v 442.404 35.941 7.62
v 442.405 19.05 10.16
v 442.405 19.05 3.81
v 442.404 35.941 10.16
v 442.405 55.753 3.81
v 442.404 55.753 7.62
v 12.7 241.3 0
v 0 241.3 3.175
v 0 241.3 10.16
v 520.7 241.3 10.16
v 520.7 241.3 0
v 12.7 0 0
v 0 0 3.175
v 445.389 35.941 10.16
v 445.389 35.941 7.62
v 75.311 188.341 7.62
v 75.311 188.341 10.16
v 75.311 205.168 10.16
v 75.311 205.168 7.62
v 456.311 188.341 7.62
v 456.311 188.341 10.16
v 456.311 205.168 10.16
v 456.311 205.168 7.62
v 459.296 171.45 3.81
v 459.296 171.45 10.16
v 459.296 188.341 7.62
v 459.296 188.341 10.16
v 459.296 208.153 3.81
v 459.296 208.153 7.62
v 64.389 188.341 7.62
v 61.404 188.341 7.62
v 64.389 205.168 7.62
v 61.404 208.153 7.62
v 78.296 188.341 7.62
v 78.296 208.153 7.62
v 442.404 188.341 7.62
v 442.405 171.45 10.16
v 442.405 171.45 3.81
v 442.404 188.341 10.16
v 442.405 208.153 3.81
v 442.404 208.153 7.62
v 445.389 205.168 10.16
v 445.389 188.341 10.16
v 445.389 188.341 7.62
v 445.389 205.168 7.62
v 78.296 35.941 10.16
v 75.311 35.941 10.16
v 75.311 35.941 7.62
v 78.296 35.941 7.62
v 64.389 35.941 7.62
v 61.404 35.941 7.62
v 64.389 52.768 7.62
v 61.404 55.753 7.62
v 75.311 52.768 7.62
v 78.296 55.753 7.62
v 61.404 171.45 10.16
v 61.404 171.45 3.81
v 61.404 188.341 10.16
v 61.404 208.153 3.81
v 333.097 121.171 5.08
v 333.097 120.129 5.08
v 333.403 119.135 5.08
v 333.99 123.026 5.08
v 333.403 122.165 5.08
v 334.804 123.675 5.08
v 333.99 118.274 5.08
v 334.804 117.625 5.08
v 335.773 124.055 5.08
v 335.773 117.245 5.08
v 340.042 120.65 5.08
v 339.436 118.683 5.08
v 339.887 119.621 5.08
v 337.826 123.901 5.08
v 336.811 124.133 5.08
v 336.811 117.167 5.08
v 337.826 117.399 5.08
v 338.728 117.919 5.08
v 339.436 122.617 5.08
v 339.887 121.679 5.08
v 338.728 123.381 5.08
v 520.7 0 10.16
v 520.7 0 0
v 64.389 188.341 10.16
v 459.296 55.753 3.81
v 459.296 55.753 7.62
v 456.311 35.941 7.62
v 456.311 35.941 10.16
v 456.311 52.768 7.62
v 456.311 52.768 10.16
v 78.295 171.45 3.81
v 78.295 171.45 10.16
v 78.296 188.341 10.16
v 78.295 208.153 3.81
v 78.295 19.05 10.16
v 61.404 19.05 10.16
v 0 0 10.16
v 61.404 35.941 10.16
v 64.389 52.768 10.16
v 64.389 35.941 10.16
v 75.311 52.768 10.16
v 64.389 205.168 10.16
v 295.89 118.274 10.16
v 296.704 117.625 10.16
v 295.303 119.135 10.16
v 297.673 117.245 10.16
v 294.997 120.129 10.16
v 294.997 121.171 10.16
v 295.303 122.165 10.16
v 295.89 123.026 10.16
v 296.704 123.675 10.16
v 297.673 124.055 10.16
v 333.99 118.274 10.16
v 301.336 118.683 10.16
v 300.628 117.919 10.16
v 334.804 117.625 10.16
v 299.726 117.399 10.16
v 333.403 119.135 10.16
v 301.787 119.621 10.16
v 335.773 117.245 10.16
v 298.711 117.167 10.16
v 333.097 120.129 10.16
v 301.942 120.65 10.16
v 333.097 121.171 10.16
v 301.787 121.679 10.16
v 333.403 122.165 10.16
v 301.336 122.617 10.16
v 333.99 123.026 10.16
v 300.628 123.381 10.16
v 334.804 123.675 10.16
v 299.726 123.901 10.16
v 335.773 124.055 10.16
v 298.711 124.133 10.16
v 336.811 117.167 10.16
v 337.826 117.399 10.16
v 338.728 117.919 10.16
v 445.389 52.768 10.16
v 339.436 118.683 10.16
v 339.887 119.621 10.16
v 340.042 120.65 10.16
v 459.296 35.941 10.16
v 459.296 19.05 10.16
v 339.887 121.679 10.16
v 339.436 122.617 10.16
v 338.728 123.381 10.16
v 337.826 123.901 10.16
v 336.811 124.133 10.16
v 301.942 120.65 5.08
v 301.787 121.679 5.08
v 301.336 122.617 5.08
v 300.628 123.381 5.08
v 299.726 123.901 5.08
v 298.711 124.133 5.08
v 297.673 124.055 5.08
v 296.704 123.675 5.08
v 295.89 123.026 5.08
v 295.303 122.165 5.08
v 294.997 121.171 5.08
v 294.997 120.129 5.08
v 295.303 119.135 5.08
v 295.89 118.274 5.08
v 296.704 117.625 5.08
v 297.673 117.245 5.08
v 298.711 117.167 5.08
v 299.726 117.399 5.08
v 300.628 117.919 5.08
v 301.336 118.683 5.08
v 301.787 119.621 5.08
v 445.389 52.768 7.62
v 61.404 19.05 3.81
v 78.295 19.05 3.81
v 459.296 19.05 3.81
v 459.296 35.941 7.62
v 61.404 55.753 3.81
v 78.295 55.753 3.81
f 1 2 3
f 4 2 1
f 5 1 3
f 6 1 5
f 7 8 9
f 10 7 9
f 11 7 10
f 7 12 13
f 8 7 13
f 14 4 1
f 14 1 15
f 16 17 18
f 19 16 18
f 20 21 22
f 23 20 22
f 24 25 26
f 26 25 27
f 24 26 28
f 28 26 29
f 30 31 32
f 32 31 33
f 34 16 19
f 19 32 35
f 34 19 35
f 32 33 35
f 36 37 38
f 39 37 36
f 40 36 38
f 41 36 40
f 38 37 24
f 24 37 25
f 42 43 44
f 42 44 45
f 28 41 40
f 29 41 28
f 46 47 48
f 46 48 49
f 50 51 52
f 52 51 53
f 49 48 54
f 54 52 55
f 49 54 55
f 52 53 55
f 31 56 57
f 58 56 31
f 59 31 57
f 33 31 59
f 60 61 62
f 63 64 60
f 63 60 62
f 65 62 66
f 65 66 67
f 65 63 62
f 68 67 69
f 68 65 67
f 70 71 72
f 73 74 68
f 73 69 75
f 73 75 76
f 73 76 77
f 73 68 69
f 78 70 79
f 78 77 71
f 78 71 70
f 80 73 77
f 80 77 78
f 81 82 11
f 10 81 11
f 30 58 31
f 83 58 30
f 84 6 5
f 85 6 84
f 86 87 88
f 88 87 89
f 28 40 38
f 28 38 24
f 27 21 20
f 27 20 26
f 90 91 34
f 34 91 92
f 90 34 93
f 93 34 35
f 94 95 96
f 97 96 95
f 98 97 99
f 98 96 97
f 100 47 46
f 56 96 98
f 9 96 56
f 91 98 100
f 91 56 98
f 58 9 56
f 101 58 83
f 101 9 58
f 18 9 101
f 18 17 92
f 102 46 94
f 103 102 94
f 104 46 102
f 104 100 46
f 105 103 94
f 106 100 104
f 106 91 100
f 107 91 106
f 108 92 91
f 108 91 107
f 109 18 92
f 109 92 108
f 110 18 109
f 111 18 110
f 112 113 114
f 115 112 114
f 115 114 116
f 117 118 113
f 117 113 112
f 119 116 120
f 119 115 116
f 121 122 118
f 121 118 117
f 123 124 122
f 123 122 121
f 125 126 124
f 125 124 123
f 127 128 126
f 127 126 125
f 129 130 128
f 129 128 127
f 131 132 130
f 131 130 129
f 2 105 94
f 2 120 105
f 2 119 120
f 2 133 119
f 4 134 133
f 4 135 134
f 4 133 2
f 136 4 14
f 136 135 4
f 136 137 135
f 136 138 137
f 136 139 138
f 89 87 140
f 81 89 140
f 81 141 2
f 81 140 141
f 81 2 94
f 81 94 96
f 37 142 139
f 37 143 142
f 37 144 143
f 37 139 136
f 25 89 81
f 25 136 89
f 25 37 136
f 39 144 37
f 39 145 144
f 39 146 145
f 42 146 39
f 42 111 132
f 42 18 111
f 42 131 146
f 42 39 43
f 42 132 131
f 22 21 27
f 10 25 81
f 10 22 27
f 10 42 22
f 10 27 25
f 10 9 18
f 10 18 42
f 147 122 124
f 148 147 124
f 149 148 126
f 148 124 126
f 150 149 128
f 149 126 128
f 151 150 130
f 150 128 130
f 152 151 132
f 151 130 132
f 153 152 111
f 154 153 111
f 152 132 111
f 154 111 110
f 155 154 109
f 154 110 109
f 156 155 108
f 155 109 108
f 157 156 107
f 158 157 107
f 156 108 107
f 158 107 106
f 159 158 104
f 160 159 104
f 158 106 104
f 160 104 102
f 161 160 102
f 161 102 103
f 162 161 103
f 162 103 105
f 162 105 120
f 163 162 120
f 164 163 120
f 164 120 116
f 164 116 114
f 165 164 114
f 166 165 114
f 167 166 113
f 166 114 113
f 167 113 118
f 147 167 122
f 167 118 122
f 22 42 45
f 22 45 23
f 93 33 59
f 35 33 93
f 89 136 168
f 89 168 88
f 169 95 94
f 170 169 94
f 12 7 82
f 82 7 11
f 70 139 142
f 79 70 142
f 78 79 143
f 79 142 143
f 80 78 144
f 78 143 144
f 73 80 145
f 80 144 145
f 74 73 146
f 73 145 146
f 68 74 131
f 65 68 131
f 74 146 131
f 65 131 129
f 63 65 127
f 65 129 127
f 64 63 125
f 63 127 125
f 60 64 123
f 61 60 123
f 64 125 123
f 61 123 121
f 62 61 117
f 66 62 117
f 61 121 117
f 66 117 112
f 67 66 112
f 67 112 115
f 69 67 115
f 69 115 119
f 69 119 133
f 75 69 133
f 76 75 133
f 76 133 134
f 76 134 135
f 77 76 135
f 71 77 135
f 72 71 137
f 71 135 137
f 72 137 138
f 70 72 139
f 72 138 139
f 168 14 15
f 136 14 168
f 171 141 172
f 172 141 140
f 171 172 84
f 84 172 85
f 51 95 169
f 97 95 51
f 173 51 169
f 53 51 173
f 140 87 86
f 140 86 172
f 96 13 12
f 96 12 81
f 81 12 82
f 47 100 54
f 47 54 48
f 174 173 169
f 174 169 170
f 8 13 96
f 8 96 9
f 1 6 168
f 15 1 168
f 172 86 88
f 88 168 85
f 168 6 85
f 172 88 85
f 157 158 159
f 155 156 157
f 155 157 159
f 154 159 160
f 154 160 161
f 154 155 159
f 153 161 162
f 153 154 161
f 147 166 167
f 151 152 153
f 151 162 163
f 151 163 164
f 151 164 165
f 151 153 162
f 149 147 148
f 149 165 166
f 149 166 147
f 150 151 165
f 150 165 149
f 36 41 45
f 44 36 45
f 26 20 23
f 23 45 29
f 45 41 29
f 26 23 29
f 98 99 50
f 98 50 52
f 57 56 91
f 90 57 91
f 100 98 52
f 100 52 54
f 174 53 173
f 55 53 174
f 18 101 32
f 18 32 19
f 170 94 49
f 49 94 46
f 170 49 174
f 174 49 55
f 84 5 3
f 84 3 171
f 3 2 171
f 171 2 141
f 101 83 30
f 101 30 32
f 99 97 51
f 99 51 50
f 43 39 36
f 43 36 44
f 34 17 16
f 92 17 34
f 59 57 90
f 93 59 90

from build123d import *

# Parameters (mm, degrees)
F0_W      = 520.7
F0_H      = 241.3
F1_DEPTH  = 10.16
F3_W      = 16.891
F3_H      = 36.703
F4_DEPTH  = 6.35
F5_W      = 2.9845
F5_H      = 19.812
F6_DEPTH  = 2.54
F7_W      = 10.922
F7_H      = 2.9845
F8_DEPTH  = 2.54
F2_R      = 3.4925
F9_DEPTH  = 5.08
F11_DEPTH = 254


with BuildPart() as f1:
    # F0 (on Top) → F1 (new body)
    with BuildSketch(Plane.XY):
        with Locations((260.35, 120.65)):
            Rectangle(F0_W, F0_H)
    extrude(amount=F1_DEPTH)

    # F3 (on face) → F4 (cut)
    with BuildSketch(Plane.XY.offset(10.16)):
        with Locations((69.85, 189.8015)):
            Rectangle(F3_W, F3_H)
        with Locations((69.85, 37.4015)):
            Rectangle(F3_W, F3_H)
        with Locations((450.85, 37.4015)):
            Rectangle(F3_W, F3_H)
        with Locations((450.85, 189.8015)):
            Rectangle(F3_W, F3_H)
    extrude(amount=-F4_DEPTH, mode=Mode.SUBTRACT)

    # F5 (on face) → F6 (join)
    with BuildSketch(Plane.XY.offset(10.16)):
        with Locations((62.89675, 198.247)):
            Rectangle(F5_W, F5_H)
        with Locations((76.80325, 198.247)):
            Rectangle(F5_W, F5_H)
        Polygon((64.389, 55.753), (61.4045, 55.753), (61.4045, 35.941), (64.389, 35.941), (64.389, 52.578), align=None)
        Polygon((78.2955, 55.753), (75.311, 55.753), (75.311, 52.578), (75.311, 35.941), (78.2955, 35.941), align=None)
        with Locations((457.80325, 45.847)):
            Rectangle(F5_W, F5_H)
        with Locations((443.89675, 45.847)):
            Rectangle(F5_W, F5_H)
        with Locations((443.89675, 198.247)):
            Rectangle(F5_W, F5_H)
        with Locations((457.80325, 198.247)):
            Rectangle(F5_W, F5_H)
    extrude(amount=-F6_DEPTH)

    # F7 (on face) → F8 (join)
    with BuildSketch(Plane.XY.offset(10.16)):
        with Locations((69.85, 54.26075)):
            Rectangle(F7_W, F7_H)
        with Locations((69.85, 206.66075)):
            Rectangle(F7_W, F7_H)
        with Locations((450.85, 54.26075)):
            Rectangle(F7_W, F7_H)
        with Locations((450.85, 206.66075)):
            Rectangle(F7_W, F7_H)
    extrude(amount=-F8_DEPTH)

    # F2 (on face) → F9 (cut)
    with BuildSketch(Plane.XY.offset(10.16)):
        with Locations((298.45, 120.65)):
            Circle(F2_R)
        with Locations((336.55, 120.65)):
            Circle(F2_R)
    extrude(amount=-F9_DEPTH, mode=Mode.SUBTRACT)

    # F10 (on face) → F11 (cut)
    with BuildSketch(Plane.XZ):
        Polygon((12.7, 0), (0, 3.175), (0, 0), align=None)
    extrude(amount=-F11_DEPTH, mode=Mode.SUBTRACT)


solid = f1.part
